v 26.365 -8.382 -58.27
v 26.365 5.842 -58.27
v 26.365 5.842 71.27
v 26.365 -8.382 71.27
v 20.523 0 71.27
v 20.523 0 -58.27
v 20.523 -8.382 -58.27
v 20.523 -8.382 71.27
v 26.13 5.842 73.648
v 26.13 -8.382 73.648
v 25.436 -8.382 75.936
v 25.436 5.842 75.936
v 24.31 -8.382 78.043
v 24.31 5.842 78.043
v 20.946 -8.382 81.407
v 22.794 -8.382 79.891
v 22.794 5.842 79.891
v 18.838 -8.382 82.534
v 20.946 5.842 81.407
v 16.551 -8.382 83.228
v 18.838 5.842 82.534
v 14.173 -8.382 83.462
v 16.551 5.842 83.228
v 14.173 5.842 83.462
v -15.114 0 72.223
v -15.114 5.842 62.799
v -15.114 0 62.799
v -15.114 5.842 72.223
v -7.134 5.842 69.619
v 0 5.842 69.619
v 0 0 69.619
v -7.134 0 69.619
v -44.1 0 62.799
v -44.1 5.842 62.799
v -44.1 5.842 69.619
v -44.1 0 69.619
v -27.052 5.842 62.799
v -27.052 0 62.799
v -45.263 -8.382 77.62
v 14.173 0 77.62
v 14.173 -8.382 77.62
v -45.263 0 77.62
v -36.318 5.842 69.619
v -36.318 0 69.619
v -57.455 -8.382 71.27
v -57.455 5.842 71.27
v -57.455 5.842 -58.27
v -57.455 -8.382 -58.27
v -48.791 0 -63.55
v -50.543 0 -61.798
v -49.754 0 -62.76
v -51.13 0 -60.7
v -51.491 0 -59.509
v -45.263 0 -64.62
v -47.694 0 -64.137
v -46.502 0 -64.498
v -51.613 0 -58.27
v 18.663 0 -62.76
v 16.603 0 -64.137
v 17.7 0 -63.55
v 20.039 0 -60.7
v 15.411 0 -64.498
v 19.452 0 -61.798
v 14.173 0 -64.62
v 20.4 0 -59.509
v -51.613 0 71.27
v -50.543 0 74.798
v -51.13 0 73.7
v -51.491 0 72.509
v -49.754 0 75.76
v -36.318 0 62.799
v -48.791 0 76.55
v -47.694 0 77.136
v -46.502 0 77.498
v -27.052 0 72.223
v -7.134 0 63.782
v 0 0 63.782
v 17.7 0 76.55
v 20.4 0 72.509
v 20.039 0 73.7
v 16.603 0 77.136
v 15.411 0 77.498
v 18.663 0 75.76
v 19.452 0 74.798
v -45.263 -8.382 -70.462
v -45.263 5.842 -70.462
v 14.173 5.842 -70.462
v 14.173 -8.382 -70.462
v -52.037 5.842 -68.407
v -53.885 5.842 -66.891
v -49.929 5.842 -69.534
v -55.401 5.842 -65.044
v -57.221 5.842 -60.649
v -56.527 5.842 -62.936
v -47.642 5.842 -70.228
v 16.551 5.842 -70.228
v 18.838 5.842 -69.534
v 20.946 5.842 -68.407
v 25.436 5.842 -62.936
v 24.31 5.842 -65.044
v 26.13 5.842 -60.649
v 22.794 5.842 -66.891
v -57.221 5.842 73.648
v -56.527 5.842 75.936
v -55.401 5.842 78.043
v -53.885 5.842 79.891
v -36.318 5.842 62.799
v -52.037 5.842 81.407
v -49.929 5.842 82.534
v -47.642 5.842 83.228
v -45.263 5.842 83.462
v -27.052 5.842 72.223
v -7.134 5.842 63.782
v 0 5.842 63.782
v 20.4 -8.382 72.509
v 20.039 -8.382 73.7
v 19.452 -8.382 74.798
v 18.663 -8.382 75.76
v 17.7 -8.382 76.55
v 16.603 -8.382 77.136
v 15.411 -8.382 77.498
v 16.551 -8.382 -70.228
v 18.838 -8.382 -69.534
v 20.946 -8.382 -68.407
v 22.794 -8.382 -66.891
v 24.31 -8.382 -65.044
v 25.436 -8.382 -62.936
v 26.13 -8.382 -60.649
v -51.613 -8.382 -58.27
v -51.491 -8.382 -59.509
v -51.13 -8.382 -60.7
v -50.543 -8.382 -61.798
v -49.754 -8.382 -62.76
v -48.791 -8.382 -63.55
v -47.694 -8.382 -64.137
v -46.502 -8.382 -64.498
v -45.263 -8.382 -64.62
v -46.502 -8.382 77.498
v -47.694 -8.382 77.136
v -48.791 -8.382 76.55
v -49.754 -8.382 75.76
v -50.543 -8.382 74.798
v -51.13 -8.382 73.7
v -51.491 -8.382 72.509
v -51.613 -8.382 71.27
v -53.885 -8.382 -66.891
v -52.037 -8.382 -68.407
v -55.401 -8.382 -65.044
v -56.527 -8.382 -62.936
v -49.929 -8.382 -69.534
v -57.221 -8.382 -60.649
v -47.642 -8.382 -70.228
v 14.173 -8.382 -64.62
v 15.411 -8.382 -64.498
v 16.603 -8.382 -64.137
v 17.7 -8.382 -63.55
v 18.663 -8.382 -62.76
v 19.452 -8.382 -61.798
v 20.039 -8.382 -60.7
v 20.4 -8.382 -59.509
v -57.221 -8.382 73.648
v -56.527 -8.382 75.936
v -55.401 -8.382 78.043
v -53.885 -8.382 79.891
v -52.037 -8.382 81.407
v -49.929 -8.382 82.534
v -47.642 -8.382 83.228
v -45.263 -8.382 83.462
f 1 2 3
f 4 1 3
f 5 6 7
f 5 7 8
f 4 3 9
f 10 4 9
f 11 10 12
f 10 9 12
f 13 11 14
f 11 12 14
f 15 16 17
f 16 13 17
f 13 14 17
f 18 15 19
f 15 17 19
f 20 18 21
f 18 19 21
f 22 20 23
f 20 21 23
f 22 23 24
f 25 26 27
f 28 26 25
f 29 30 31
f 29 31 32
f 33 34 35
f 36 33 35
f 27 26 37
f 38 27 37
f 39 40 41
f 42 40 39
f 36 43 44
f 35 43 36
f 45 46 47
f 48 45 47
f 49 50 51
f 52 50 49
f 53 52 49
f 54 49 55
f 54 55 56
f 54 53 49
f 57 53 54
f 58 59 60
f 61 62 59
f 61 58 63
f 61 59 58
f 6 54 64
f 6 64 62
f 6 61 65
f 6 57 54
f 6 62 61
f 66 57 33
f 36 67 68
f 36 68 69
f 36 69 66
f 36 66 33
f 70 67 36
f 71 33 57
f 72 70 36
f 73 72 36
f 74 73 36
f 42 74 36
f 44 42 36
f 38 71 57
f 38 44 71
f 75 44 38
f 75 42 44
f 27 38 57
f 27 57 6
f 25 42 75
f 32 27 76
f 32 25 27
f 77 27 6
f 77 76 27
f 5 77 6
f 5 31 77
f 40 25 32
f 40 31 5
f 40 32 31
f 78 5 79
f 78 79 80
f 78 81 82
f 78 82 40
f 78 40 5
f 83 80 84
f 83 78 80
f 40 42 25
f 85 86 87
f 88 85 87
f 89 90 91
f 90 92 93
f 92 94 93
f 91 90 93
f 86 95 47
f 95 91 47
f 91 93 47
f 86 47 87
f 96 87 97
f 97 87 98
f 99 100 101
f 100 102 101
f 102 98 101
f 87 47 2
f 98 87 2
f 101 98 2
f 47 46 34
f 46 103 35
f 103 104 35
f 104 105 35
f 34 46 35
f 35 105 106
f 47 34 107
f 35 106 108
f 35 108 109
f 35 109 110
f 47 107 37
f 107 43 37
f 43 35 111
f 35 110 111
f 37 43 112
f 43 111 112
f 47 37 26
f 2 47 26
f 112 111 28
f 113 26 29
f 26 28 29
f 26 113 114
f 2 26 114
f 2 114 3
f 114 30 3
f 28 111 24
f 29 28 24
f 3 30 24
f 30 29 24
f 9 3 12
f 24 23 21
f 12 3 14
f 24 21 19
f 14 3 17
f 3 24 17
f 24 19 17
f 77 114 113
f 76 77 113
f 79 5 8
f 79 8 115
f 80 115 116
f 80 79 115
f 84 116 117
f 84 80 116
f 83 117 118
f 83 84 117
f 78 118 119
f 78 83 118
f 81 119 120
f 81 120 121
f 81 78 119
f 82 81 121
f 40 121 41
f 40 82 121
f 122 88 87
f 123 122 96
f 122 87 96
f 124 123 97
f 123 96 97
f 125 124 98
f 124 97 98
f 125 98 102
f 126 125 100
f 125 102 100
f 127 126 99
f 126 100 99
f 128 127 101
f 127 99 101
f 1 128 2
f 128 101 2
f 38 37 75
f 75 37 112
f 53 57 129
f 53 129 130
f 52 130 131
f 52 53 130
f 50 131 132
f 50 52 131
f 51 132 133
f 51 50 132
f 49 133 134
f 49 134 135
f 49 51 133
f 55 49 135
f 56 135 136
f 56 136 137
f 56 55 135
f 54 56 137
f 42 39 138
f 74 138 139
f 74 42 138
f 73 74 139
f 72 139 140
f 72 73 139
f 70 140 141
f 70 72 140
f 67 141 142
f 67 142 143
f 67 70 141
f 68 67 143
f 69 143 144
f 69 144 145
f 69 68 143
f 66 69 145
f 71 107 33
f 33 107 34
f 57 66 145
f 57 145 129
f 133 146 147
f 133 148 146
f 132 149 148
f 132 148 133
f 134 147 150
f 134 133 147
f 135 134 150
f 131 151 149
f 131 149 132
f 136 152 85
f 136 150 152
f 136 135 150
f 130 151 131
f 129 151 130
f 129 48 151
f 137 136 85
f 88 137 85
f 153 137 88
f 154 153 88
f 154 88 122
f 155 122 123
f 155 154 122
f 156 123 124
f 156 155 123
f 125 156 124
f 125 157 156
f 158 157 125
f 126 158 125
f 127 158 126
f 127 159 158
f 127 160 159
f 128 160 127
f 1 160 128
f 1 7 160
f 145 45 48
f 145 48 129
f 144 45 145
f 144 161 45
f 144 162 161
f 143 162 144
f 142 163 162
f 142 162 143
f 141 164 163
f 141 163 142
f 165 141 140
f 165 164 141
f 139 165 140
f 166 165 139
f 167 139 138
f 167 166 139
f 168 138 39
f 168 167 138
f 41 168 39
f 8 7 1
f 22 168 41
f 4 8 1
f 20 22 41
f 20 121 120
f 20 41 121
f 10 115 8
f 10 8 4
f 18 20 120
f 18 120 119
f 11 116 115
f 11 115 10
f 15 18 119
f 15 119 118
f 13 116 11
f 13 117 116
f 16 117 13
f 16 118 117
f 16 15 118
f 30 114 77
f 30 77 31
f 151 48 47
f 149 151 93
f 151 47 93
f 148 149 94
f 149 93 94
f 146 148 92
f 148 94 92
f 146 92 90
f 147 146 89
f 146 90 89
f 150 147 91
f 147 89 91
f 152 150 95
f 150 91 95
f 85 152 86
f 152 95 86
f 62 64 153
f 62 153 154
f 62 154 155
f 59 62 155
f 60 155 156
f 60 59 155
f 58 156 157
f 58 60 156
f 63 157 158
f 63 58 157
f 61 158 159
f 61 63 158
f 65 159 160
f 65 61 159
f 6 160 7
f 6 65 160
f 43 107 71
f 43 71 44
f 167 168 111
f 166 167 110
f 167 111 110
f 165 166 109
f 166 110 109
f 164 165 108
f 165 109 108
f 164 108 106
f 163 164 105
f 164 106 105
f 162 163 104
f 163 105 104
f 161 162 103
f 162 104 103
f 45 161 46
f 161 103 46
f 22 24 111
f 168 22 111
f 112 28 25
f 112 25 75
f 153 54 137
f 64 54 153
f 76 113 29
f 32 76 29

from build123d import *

# Parameters (mm, degrees)
F1_DEPTH = 8.382
F2_T     = 5.842
F3_W     = 7.7823624015
F3_H     = 6.8200882353
F3_W_2   = 7.1338275447
F3_H_2   = 5.8367699385
F3_W_3   = 11.938
F3_H_3   = 9.4247385517
F4_DEPTH = 5.842


with BuildPart() as f1:
    # F0 (on Front) → F1 (new body)
    with BuildSketch(Plane.XZ):
        with BuildLine():
            Line((-45.2634918147, -64.6201544654), (14.1725081853, -64.6201544654))
            ThreePointArc((14.1725081853, -64.6201544654), (18.6626362458, -62.760282526), (20.5225081853, -58.2701544654))
            Line((20.5225081853, -58.2701544654), (20.5225081853, 71.2698455346))
            ThreePointArc((20.5225081853, 71.2698455346), (18.6626362458, 75.7599735951), (14.1725081853, 77.6198455346))
            Line((14.1725081853, 77.6198455346), (-45.2634918147, 77.6198455346))
            ThreePointArc((-45.2634918147, 77.6198455346), (-49.7536198753, 75.7599735951), (-51.6134918147, 71.2698455346))
            Line((-51.6134918147, 71.2698455346), (-51.6134918147, -58.2701544654))
            ThreePointArc((-51.6134918147, -58.2701544654), (-49.7536198753, -62.760282526), (-45.2634918147, -64.6201544654))
        make_face()
    extrude(amount=F1_DEPTH)

    # F2
    f2_openings = [f1.faces().sort_by_distance(p)[0] for p in [
        (-15.545492, -8.382, 6.499846),
    ]]
    offset(amount=F2_T, openings=f2_openings, kind=Kind.INTERSECTION)

    # F3 (on face) → F4 (cut)
    with BuildSketch(Plane(origin=(0, 5.842, 0), x_dir=(-1, 0, 0), z_dir=(0, 1, 0))):
        with Locations((40.2088426054, 66.2087770264)):
            Rectangle(F3_W, F3_H)
        with Locations((3.5669137724, 66.7004361749)):
            Rectangle(F3_W_2, F3_H_2)
        with Locations((21.0826918147, 67.5111021847)):
            Rectangle(F3_W_3, F3_H_3)
    extrude(amount=-F4_DEPTH, mode=Mode.SUBTRACT)


solid = f1.part
